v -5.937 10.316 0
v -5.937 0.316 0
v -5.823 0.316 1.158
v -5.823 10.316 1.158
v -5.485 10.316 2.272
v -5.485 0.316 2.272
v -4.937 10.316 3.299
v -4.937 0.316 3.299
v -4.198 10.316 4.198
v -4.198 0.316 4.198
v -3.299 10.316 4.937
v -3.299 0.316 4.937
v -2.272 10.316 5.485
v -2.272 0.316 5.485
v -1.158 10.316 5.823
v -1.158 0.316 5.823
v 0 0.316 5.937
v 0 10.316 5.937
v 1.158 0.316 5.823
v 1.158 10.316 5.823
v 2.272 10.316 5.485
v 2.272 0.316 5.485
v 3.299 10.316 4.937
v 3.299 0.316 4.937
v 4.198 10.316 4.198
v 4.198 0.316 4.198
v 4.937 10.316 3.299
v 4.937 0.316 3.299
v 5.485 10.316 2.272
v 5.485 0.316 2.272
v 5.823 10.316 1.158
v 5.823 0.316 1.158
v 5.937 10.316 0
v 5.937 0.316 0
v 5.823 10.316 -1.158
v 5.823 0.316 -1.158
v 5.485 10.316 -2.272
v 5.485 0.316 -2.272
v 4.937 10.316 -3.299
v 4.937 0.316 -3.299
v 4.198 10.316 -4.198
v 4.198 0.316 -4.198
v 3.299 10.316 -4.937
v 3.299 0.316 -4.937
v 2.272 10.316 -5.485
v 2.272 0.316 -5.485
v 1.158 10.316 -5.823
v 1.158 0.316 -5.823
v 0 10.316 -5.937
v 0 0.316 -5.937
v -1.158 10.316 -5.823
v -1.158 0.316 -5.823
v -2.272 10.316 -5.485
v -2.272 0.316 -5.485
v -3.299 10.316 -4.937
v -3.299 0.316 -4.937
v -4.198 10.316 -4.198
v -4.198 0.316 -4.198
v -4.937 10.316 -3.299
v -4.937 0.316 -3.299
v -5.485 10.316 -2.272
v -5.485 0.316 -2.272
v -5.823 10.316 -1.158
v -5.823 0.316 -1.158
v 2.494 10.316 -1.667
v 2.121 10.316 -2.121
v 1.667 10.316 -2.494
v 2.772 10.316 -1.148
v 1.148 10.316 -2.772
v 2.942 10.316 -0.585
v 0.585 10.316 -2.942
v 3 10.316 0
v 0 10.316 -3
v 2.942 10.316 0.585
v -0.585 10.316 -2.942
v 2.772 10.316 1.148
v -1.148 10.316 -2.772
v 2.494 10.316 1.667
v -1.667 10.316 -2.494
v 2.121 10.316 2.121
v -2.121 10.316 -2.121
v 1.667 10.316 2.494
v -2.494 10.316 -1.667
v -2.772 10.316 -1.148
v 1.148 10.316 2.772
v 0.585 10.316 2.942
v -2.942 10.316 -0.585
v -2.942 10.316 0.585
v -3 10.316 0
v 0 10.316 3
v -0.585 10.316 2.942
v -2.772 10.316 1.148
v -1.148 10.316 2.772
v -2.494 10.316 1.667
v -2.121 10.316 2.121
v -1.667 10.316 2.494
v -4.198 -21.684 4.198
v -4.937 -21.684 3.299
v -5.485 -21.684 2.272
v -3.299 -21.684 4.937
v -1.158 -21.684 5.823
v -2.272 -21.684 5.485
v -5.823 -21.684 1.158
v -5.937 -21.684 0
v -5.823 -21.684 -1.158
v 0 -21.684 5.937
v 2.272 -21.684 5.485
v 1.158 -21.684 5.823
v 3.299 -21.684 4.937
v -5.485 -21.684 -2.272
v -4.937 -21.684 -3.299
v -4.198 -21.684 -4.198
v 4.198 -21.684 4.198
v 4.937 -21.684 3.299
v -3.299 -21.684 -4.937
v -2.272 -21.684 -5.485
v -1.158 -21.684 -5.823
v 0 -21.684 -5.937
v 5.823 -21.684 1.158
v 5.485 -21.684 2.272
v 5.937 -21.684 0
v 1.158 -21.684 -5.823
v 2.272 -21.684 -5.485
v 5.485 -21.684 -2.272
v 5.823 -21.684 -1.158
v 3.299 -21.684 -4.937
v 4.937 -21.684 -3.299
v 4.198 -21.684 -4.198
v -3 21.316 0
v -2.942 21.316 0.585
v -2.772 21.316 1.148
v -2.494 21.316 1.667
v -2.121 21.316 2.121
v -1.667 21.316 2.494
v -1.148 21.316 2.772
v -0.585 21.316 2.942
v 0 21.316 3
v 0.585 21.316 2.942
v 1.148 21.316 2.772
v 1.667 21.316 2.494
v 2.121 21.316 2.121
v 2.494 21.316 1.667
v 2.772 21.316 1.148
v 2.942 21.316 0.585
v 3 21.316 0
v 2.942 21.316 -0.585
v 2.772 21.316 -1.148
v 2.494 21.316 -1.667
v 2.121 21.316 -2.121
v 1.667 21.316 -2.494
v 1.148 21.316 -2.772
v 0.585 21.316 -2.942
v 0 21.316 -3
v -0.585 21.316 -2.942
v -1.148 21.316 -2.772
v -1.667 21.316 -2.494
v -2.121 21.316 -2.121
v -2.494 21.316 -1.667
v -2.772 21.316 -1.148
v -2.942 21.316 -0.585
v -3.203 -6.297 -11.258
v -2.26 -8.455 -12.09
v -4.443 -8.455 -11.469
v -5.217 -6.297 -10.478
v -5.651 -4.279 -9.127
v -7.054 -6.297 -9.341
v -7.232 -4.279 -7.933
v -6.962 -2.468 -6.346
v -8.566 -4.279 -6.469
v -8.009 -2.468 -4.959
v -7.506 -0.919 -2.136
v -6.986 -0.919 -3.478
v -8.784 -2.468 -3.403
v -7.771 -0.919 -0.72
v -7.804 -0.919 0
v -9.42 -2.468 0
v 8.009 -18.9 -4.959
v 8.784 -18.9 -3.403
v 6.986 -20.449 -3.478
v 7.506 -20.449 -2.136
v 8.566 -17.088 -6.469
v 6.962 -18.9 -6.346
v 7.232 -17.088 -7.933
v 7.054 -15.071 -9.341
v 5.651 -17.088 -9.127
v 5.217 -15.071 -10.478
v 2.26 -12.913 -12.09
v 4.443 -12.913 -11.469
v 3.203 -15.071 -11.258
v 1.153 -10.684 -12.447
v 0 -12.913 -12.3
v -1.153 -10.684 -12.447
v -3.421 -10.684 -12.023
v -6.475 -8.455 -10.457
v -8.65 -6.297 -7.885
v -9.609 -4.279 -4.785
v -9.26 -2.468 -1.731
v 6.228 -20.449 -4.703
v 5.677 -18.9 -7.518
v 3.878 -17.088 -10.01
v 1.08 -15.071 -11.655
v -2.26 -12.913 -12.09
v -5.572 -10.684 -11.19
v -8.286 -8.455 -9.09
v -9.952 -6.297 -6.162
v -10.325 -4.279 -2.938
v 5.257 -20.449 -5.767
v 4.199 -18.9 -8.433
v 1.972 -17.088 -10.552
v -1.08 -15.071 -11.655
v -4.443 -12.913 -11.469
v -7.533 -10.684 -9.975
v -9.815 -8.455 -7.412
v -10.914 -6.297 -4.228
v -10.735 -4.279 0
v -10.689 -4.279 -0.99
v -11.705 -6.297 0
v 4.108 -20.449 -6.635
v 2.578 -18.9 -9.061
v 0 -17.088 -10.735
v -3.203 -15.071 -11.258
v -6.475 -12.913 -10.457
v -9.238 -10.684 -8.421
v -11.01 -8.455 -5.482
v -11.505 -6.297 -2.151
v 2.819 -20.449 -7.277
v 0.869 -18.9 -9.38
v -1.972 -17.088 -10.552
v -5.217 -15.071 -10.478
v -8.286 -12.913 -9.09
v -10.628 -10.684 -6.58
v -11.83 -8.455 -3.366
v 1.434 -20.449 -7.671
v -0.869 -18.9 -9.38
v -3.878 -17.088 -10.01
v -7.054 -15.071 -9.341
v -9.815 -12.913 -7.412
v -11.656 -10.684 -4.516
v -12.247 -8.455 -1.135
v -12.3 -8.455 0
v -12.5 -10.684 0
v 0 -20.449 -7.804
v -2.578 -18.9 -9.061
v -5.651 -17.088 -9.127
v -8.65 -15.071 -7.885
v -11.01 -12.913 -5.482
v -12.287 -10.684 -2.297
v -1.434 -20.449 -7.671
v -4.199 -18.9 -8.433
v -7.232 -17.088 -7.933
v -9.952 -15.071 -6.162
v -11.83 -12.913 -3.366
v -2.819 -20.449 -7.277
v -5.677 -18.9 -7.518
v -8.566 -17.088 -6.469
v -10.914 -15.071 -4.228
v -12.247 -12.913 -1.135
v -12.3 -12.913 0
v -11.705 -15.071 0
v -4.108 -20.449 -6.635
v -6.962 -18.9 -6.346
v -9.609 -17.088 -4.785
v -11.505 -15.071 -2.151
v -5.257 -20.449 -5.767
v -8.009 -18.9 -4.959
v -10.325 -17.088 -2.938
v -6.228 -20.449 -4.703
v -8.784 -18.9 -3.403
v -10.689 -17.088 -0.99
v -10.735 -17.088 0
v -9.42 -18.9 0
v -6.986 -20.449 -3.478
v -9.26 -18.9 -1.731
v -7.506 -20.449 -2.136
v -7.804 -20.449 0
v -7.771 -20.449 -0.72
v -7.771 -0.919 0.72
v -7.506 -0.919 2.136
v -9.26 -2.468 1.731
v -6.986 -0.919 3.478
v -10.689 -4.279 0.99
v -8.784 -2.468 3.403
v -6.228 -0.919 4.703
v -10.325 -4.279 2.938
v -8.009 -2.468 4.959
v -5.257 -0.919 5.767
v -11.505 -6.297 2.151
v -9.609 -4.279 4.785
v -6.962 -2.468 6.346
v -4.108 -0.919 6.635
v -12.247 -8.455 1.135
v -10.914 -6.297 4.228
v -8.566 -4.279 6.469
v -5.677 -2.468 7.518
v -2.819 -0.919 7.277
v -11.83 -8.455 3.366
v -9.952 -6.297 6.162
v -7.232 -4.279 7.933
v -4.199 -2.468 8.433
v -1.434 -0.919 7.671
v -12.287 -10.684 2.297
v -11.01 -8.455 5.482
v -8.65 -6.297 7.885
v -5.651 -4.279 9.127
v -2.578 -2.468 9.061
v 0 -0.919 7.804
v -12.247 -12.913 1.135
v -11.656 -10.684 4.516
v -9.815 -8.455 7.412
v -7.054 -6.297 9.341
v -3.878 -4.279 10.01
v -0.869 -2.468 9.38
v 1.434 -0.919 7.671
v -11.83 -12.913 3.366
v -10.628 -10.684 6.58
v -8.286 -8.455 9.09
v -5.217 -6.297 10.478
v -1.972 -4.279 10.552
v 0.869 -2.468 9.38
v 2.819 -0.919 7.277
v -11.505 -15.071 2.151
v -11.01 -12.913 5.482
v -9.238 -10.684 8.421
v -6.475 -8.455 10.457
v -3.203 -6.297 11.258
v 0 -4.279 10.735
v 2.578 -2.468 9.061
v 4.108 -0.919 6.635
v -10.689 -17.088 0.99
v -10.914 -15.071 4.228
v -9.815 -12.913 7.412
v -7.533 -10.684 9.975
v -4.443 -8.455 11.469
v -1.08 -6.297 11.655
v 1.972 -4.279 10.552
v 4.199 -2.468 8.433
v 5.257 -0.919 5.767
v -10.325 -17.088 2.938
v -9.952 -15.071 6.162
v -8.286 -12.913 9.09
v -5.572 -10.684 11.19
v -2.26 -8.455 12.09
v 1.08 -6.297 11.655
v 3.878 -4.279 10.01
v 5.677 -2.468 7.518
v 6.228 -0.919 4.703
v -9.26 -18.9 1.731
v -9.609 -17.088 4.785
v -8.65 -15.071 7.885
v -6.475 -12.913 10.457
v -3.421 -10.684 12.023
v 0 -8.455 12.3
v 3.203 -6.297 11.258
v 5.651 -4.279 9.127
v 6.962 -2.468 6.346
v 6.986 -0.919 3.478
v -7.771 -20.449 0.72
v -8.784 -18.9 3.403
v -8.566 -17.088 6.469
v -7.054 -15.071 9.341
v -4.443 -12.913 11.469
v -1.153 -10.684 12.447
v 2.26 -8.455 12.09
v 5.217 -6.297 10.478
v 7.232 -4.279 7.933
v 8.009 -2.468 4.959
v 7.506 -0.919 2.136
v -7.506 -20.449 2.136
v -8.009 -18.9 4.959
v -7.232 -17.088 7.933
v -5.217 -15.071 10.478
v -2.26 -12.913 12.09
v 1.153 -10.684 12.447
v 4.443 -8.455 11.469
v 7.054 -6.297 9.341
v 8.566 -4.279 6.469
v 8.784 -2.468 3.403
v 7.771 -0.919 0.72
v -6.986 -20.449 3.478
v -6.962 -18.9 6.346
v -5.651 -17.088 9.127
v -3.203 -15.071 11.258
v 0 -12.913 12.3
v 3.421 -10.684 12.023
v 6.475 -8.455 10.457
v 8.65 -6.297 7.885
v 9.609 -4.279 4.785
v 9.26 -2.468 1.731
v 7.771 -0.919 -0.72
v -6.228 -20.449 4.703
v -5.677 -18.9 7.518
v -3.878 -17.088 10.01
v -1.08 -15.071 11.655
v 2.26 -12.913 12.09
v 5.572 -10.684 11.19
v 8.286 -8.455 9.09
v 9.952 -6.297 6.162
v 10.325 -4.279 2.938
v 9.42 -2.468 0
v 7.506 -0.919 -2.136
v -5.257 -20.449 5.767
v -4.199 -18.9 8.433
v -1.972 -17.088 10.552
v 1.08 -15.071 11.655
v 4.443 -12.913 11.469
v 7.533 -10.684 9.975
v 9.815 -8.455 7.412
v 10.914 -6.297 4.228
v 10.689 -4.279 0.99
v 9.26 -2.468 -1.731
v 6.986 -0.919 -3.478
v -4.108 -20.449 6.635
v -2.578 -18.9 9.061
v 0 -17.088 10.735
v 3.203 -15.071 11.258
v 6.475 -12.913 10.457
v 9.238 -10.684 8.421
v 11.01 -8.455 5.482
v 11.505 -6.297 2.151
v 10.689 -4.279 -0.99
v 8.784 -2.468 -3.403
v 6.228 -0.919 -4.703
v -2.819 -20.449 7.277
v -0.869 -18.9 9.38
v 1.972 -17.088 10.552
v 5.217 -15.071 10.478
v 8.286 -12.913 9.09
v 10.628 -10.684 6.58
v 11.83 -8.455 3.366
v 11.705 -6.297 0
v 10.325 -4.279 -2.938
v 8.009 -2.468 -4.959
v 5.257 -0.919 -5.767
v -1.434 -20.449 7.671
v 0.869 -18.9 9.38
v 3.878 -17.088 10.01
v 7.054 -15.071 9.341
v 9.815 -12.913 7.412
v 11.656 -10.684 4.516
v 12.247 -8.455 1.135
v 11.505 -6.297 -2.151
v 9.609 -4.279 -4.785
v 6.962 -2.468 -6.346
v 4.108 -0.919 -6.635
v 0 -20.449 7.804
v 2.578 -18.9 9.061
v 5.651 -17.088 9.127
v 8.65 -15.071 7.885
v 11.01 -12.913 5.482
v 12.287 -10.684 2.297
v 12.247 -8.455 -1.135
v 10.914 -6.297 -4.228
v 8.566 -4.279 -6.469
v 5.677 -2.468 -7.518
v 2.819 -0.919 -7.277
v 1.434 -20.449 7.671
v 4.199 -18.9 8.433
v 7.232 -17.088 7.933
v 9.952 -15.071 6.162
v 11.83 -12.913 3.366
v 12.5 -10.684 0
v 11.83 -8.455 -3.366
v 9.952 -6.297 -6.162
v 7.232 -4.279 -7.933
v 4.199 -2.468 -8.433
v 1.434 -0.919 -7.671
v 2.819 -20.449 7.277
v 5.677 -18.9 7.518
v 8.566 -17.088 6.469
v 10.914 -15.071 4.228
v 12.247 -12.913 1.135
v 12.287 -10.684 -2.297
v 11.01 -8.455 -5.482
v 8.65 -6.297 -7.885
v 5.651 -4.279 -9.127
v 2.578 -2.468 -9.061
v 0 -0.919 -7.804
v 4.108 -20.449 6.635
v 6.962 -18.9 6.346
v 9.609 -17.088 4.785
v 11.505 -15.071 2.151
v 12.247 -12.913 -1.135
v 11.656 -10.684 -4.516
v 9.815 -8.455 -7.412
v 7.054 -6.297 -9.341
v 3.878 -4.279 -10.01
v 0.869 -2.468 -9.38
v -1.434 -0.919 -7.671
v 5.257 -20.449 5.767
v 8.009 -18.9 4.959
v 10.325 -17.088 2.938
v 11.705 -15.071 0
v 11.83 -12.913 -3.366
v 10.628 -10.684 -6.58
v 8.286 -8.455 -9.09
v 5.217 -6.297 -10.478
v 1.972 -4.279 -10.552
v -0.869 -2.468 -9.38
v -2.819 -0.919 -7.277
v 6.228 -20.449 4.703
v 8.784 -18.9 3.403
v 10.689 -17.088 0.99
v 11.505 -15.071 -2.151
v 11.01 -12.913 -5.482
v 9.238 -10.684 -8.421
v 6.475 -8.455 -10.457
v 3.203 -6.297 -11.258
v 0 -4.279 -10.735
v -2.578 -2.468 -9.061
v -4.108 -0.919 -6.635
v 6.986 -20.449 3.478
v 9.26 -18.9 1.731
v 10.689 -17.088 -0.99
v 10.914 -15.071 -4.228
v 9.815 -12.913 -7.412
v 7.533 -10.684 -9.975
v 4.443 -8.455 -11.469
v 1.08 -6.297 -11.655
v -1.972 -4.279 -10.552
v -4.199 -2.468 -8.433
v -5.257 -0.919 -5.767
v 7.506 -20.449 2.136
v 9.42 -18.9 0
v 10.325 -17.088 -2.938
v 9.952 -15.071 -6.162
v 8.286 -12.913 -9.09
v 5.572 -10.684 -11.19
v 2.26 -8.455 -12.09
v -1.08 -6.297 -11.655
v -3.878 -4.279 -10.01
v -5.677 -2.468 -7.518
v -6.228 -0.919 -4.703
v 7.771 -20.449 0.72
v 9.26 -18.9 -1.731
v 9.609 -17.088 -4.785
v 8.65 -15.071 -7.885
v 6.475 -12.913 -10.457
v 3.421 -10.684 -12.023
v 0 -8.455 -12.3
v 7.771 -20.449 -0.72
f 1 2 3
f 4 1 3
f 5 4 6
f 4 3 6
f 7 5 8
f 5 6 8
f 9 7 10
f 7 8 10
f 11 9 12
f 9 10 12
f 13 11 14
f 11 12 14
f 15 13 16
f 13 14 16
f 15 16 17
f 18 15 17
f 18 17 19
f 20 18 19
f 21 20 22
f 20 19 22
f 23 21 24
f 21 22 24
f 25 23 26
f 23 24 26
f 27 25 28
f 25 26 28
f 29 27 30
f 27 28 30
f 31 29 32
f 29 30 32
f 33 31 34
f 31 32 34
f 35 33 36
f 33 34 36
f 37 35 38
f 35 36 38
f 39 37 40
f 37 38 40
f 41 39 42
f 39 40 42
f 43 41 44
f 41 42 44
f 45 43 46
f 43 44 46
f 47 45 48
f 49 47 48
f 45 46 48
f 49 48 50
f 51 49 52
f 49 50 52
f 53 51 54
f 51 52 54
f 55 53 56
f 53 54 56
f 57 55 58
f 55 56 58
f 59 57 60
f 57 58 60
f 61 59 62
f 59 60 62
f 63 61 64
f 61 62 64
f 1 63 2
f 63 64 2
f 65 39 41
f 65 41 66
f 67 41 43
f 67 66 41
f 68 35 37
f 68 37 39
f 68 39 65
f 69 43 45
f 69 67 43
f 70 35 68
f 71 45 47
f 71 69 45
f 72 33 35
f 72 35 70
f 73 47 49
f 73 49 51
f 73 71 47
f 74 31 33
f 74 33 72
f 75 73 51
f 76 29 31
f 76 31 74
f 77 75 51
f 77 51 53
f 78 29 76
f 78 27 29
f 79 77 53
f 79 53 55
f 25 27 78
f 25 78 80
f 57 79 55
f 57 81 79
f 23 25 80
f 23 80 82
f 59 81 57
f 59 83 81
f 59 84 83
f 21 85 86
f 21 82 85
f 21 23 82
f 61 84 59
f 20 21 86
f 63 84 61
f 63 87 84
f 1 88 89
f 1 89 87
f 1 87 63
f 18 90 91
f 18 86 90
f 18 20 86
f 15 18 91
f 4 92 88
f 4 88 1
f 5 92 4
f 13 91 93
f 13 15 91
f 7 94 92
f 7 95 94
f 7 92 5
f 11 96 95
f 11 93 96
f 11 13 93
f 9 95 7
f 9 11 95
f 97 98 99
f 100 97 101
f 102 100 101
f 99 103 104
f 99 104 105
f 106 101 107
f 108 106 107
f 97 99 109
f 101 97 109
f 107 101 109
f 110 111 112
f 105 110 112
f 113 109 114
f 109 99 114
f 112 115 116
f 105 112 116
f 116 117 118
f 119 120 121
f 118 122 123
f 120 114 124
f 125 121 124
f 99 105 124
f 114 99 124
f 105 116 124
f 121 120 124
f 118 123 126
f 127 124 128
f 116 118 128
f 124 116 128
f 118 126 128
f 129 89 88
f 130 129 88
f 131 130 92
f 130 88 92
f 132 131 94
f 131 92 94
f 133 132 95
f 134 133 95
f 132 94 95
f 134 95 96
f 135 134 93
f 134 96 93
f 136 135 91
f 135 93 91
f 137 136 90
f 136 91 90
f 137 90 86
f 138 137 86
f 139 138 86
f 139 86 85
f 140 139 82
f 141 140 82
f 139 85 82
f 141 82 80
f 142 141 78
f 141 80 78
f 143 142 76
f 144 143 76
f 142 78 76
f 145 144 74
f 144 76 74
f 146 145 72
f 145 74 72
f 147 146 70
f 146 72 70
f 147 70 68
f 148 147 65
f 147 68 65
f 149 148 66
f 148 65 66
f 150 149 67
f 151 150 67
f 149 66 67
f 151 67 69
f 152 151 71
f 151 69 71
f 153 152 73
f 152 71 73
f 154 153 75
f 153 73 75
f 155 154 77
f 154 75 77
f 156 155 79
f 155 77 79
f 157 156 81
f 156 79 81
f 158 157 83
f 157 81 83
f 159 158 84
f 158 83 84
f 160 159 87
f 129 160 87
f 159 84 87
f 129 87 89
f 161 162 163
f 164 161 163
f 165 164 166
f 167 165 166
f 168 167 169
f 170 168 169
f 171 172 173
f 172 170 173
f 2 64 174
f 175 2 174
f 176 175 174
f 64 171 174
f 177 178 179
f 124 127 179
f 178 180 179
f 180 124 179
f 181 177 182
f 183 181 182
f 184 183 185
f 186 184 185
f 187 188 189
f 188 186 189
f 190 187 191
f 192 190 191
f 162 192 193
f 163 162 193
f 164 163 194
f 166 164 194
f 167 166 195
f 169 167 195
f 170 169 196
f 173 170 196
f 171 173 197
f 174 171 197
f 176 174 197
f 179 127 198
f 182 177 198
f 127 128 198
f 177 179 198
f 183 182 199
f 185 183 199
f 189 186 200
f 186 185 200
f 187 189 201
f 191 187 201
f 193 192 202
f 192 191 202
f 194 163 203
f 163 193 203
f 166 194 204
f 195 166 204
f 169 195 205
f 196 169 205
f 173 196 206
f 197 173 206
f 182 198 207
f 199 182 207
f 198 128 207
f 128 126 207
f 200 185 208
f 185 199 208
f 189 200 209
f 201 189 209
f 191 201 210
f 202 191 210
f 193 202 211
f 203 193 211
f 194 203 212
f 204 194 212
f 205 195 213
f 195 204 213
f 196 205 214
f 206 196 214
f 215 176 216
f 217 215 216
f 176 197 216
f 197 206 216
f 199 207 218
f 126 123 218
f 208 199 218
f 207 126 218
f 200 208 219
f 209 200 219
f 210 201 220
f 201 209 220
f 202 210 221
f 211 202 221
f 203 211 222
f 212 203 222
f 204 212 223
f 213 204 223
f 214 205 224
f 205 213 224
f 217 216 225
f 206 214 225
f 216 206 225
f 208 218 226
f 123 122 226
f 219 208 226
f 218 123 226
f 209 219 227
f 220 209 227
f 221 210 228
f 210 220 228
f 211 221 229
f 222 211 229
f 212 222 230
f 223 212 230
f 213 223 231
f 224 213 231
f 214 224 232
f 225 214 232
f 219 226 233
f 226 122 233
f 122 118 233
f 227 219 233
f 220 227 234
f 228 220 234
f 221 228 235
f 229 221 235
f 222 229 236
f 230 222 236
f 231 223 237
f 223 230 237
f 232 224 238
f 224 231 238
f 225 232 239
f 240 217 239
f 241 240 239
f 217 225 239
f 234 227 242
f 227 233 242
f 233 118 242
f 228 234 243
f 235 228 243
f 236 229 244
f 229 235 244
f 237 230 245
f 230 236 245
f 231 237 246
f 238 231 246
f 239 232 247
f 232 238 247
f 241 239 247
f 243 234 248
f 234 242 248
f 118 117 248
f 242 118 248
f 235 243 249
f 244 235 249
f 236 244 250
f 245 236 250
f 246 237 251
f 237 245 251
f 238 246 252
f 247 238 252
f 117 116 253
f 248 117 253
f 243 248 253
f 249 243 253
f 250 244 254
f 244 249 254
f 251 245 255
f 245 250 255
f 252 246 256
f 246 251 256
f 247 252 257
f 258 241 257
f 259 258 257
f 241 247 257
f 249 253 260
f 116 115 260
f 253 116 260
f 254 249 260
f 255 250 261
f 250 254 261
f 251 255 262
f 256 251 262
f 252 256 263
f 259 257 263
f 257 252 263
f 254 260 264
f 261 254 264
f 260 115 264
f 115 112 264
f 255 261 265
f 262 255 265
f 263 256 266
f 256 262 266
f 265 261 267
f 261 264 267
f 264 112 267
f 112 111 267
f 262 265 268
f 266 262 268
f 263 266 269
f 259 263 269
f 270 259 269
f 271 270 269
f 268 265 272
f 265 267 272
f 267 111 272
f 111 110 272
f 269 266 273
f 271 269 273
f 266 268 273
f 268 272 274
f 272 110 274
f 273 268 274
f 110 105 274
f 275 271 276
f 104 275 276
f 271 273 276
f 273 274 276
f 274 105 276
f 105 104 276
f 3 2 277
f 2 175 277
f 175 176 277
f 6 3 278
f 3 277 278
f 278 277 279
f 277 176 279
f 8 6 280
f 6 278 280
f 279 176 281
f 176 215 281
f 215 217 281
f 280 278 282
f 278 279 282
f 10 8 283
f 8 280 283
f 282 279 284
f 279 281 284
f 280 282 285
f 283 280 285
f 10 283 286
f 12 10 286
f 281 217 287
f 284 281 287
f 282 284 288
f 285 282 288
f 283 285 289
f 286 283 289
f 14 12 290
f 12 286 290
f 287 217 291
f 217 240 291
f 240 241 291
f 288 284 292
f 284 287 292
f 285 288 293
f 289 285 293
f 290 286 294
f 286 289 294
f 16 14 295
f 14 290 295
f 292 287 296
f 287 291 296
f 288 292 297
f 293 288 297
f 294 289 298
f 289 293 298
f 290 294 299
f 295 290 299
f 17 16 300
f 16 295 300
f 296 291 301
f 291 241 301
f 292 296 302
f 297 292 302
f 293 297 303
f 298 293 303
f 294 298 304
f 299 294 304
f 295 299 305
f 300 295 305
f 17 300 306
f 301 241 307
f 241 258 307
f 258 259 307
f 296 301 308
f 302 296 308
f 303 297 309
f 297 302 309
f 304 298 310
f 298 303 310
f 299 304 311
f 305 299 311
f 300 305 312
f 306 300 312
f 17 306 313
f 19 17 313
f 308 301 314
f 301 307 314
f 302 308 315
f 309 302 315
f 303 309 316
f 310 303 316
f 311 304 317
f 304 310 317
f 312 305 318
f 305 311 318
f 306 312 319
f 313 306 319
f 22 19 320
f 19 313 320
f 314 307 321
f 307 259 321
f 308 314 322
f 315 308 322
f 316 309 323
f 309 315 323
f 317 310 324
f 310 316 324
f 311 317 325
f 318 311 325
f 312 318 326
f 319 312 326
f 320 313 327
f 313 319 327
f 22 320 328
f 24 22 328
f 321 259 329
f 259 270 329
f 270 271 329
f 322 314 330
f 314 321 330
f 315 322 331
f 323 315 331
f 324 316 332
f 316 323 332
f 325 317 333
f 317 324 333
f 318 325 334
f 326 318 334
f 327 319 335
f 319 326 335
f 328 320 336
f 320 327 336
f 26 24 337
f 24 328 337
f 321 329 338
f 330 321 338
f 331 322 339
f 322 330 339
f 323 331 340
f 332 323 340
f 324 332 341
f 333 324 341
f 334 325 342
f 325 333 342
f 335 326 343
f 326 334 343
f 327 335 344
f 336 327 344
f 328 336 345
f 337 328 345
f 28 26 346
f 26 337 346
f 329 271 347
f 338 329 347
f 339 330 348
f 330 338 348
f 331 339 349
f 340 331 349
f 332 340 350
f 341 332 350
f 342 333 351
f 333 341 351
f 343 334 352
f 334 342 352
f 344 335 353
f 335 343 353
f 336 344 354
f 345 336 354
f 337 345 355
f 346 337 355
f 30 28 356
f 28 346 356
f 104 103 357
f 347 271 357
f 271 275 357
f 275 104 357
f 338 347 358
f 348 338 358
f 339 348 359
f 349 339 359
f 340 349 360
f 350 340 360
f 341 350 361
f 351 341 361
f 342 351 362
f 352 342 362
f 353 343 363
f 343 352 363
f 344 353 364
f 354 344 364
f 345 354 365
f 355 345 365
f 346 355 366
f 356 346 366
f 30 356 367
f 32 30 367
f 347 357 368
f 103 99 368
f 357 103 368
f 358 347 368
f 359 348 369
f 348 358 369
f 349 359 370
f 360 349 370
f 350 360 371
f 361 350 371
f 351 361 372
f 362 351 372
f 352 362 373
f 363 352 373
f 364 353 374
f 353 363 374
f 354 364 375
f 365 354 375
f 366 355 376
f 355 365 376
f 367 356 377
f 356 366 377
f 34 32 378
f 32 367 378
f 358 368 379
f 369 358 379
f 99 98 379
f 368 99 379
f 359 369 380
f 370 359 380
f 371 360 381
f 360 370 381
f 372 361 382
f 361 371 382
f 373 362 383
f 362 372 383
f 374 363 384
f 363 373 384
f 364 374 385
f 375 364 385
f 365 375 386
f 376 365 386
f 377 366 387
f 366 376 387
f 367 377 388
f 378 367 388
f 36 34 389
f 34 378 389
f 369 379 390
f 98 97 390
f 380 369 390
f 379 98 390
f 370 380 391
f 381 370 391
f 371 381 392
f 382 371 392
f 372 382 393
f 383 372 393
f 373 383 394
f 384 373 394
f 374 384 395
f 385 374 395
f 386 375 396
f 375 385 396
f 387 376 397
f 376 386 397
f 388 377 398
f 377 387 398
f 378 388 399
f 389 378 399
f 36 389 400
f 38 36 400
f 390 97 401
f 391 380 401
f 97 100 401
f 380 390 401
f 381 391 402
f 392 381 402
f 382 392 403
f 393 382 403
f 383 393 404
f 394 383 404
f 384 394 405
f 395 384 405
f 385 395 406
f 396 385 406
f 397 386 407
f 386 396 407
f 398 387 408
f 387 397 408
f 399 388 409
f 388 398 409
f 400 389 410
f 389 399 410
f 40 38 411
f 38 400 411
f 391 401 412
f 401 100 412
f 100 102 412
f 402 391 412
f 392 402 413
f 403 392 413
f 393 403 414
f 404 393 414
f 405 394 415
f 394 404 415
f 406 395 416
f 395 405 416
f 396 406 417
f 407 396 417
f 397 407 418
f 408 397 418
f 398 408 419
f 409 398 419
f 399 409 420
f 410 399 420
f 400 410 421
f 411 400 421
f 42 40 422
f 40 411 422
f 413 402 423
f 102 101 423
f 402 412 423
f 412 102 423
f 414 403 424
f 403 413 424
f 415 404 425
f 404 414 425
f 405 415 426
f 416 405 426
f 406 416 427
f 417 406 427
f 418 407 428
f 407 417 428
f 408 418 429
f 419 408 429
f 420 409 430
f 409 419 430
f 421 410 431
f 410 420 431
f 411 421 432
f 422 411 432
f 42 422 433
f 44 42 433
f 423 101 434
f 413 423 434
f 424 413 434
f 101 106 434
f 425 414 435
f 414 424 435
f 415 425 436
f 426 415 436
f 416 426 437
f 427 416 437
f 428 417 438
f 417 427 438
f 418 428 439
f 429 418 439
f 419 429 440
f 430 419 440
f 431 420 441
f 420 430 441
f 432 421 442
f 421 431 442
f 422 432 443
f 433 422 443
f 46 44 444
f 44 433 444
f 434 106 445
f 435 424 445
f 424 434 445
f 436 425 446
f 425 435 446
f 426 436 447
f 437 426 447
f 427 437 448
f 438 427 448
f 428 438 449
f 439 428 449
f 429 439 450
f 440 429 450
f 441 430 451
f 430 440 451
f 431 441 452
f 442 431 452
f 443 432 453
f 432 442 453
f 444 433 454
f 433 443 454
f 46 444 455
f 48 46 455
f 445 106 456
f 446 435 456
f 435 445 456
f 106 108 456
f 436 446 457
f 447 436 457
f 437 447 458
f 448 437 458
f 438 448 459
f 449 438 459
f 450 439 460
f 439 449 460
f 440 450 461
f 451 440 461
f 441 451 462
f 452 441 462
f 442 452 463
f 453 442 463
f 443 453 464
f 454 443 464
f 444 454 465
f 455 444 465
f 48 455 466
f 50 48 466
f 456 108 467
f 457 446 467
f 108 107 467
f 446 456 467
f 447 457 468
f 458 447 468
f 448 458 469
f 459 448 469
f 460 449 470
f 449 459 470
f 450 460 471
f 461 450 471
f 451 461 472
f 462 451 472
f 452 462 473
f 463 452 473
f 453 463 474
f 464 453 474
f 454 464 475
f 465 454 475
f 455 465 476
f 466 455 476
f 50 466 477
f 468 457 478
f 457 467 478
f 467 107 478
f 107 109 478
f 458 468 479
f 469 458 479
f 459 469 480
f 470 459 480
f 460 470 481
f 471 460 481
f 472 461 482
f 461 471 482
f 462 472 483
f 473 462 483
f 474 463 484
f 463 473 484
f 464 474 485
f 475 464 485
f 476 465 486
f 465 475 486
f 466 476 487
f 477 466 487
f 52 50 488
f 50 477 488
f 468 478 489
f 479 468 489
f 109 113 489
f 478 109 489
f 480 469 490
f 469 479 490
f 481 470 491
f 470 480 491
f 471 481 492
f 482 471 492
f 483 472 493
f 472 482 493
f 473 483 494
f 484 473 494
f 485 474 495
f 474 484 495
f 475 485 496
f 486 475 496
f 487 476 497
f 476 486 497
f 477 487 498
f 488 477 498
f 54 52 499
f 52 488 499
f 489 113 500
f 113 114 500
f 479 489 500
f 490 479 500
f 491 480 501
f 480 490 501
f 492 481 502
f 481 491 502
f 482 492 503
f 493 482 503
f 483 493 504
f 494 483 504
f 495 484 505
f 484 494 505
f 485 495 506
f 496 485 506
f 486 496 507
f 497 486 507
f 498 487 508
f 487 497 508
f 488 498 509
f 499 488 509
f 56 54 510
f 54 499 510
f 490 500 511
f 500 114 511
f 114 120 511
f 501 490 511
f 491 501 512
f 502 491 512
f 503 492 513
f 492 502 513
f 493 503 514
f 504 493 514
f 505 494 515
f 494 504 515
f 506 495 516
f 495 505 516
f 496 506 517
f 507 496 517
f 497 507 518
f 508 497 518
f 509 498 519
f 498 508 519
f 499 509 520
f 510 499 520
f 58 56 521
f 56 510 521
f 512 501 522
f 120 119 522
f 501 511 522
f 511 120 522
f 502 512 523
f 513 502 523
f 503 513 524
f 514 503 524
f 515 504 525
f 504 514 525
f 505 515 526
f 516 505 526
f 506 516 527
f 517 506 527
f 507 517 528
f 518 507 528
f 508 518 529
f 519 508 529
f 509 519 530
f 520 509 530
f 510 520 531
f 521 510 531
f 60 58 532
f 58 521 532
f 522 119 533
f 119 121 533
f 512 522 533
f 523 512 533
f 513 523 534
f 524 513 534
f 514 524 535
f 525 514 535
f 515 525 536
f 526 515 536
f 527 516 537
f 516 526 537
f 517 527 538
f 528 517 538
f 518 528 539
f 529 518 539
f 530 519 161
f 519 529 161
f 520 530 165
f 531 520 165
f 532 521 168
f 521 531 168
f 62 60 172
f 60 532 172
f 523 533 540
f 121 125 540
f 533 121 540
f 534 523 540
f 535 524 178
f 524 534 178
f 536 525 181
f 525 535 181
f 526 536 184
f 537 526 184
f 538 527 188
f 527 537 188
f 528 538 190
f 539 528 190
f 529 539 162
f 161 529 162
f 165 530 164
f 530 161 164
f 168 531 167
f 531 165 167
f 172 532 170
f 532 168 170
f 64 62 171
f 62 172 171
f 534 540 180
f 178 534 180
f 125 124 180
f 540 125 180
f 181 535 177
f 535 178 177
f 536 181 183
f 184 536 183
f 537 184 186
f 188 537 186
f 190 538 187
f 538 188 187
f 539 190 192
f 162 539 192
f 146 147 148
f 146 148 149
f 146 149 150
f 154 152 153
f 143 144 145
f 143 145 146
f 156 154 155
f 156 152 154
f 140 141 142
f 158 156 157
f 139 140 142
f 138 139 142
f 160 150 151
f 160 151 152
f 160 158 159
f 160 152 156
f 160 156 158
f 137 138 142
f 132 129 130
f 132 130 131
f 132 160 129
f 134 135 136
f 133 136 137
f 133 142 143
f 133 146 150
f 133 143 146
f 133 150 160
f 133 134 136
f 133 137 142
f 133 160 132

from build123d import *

# Parameters (mm, degrees)
ESQUISSE4_OUTSIDE_W     = 35.66
ESQUISSE4_OUTSIDE_H     = 35.66
ESQUISSE4_OUTSIDE_W_2   = 31.580909768
ESQUISSE4_OUTSIDE_H_2   = 22
ENL_V_MAT_EXTRU_1_DEPTH = 10
ESQUISSE5_R             = 5.937171044
BOSS_EXTRU_1_DEPTH      = 10
ESQUISSE6_R             = 3
BOSS_EXTRU_2_DEPTH      = 11


with BuildPart() as part:
    # Esquisse1 → Révolution1 (revolve)
    with BuildSketch(Plane.XY):
        with BuildLine():
            Line((0, -23.183892617), (0, 1.816107383))
            ThreePointArc((0, 1.816107383), (-12.5, -10.683892617), (0, -23.183892617))
        make_face()
    revolve(axis=Axis((0, -23.183892617, 0), (0, 1, 0)))

    # Esquisse4 outside → Enlèv. mat.-Extru.1 (cut)
    with BuildSketch(Plane.XY):
        with Locations((0, -10.684)):
            Rectangle(ESQUISSE4_OUTSIDE_W, ESQUISSE4_OUTSIDE_H)
        with Locations((-0.692114094, -10.683892617)):
            Rectangle(ESQUISSE4_OUTSIDE_W_2, ESQUISSE4_OUTSIDE_H_2, mode=Mode.SUBTRACT)
    enl_v_mat_extru_1 = extrude(amount=-ENL_V_MAT_EXTRU_1_DEPTH, mode=Mode.SUBTRACT)

    # Symétrie1: Enlèv. mat.-Extru.1 across plane
    add(enl_v_mat_extru_1.mirror(Plane.XY), mode=Mode.SUBTRACT)

    # Esquisse5 → Boss.-Extru.1 (add)
    with BuildSketch(Plane(origin=(0, 0.316107383, 0), x_dir=(1, 0, 0), z_dir=(0, 1, 0))):
        with Locations(Location((0, 0, 0), (0, 0, 180))):
            Circle(ESQUISSE5_R)
    extrude(amount=BOSS_EXTRU_1_DEPTH)

    # Esquisse6 → Boss.-Extru.2 (add)
    with BuildSketch(Plane(origin=(0, 10.316107383, 0), x_dir=(1, 0, 0), z_dir=(0, 1, 0))):
        with Locations(Location((0, 0, 0), (0, 0, 180))):
            Circle(ESQUISSE6_R)
    extrude(amount=BOSS_EXTRU_2_DEPTH)


solid = part.part
